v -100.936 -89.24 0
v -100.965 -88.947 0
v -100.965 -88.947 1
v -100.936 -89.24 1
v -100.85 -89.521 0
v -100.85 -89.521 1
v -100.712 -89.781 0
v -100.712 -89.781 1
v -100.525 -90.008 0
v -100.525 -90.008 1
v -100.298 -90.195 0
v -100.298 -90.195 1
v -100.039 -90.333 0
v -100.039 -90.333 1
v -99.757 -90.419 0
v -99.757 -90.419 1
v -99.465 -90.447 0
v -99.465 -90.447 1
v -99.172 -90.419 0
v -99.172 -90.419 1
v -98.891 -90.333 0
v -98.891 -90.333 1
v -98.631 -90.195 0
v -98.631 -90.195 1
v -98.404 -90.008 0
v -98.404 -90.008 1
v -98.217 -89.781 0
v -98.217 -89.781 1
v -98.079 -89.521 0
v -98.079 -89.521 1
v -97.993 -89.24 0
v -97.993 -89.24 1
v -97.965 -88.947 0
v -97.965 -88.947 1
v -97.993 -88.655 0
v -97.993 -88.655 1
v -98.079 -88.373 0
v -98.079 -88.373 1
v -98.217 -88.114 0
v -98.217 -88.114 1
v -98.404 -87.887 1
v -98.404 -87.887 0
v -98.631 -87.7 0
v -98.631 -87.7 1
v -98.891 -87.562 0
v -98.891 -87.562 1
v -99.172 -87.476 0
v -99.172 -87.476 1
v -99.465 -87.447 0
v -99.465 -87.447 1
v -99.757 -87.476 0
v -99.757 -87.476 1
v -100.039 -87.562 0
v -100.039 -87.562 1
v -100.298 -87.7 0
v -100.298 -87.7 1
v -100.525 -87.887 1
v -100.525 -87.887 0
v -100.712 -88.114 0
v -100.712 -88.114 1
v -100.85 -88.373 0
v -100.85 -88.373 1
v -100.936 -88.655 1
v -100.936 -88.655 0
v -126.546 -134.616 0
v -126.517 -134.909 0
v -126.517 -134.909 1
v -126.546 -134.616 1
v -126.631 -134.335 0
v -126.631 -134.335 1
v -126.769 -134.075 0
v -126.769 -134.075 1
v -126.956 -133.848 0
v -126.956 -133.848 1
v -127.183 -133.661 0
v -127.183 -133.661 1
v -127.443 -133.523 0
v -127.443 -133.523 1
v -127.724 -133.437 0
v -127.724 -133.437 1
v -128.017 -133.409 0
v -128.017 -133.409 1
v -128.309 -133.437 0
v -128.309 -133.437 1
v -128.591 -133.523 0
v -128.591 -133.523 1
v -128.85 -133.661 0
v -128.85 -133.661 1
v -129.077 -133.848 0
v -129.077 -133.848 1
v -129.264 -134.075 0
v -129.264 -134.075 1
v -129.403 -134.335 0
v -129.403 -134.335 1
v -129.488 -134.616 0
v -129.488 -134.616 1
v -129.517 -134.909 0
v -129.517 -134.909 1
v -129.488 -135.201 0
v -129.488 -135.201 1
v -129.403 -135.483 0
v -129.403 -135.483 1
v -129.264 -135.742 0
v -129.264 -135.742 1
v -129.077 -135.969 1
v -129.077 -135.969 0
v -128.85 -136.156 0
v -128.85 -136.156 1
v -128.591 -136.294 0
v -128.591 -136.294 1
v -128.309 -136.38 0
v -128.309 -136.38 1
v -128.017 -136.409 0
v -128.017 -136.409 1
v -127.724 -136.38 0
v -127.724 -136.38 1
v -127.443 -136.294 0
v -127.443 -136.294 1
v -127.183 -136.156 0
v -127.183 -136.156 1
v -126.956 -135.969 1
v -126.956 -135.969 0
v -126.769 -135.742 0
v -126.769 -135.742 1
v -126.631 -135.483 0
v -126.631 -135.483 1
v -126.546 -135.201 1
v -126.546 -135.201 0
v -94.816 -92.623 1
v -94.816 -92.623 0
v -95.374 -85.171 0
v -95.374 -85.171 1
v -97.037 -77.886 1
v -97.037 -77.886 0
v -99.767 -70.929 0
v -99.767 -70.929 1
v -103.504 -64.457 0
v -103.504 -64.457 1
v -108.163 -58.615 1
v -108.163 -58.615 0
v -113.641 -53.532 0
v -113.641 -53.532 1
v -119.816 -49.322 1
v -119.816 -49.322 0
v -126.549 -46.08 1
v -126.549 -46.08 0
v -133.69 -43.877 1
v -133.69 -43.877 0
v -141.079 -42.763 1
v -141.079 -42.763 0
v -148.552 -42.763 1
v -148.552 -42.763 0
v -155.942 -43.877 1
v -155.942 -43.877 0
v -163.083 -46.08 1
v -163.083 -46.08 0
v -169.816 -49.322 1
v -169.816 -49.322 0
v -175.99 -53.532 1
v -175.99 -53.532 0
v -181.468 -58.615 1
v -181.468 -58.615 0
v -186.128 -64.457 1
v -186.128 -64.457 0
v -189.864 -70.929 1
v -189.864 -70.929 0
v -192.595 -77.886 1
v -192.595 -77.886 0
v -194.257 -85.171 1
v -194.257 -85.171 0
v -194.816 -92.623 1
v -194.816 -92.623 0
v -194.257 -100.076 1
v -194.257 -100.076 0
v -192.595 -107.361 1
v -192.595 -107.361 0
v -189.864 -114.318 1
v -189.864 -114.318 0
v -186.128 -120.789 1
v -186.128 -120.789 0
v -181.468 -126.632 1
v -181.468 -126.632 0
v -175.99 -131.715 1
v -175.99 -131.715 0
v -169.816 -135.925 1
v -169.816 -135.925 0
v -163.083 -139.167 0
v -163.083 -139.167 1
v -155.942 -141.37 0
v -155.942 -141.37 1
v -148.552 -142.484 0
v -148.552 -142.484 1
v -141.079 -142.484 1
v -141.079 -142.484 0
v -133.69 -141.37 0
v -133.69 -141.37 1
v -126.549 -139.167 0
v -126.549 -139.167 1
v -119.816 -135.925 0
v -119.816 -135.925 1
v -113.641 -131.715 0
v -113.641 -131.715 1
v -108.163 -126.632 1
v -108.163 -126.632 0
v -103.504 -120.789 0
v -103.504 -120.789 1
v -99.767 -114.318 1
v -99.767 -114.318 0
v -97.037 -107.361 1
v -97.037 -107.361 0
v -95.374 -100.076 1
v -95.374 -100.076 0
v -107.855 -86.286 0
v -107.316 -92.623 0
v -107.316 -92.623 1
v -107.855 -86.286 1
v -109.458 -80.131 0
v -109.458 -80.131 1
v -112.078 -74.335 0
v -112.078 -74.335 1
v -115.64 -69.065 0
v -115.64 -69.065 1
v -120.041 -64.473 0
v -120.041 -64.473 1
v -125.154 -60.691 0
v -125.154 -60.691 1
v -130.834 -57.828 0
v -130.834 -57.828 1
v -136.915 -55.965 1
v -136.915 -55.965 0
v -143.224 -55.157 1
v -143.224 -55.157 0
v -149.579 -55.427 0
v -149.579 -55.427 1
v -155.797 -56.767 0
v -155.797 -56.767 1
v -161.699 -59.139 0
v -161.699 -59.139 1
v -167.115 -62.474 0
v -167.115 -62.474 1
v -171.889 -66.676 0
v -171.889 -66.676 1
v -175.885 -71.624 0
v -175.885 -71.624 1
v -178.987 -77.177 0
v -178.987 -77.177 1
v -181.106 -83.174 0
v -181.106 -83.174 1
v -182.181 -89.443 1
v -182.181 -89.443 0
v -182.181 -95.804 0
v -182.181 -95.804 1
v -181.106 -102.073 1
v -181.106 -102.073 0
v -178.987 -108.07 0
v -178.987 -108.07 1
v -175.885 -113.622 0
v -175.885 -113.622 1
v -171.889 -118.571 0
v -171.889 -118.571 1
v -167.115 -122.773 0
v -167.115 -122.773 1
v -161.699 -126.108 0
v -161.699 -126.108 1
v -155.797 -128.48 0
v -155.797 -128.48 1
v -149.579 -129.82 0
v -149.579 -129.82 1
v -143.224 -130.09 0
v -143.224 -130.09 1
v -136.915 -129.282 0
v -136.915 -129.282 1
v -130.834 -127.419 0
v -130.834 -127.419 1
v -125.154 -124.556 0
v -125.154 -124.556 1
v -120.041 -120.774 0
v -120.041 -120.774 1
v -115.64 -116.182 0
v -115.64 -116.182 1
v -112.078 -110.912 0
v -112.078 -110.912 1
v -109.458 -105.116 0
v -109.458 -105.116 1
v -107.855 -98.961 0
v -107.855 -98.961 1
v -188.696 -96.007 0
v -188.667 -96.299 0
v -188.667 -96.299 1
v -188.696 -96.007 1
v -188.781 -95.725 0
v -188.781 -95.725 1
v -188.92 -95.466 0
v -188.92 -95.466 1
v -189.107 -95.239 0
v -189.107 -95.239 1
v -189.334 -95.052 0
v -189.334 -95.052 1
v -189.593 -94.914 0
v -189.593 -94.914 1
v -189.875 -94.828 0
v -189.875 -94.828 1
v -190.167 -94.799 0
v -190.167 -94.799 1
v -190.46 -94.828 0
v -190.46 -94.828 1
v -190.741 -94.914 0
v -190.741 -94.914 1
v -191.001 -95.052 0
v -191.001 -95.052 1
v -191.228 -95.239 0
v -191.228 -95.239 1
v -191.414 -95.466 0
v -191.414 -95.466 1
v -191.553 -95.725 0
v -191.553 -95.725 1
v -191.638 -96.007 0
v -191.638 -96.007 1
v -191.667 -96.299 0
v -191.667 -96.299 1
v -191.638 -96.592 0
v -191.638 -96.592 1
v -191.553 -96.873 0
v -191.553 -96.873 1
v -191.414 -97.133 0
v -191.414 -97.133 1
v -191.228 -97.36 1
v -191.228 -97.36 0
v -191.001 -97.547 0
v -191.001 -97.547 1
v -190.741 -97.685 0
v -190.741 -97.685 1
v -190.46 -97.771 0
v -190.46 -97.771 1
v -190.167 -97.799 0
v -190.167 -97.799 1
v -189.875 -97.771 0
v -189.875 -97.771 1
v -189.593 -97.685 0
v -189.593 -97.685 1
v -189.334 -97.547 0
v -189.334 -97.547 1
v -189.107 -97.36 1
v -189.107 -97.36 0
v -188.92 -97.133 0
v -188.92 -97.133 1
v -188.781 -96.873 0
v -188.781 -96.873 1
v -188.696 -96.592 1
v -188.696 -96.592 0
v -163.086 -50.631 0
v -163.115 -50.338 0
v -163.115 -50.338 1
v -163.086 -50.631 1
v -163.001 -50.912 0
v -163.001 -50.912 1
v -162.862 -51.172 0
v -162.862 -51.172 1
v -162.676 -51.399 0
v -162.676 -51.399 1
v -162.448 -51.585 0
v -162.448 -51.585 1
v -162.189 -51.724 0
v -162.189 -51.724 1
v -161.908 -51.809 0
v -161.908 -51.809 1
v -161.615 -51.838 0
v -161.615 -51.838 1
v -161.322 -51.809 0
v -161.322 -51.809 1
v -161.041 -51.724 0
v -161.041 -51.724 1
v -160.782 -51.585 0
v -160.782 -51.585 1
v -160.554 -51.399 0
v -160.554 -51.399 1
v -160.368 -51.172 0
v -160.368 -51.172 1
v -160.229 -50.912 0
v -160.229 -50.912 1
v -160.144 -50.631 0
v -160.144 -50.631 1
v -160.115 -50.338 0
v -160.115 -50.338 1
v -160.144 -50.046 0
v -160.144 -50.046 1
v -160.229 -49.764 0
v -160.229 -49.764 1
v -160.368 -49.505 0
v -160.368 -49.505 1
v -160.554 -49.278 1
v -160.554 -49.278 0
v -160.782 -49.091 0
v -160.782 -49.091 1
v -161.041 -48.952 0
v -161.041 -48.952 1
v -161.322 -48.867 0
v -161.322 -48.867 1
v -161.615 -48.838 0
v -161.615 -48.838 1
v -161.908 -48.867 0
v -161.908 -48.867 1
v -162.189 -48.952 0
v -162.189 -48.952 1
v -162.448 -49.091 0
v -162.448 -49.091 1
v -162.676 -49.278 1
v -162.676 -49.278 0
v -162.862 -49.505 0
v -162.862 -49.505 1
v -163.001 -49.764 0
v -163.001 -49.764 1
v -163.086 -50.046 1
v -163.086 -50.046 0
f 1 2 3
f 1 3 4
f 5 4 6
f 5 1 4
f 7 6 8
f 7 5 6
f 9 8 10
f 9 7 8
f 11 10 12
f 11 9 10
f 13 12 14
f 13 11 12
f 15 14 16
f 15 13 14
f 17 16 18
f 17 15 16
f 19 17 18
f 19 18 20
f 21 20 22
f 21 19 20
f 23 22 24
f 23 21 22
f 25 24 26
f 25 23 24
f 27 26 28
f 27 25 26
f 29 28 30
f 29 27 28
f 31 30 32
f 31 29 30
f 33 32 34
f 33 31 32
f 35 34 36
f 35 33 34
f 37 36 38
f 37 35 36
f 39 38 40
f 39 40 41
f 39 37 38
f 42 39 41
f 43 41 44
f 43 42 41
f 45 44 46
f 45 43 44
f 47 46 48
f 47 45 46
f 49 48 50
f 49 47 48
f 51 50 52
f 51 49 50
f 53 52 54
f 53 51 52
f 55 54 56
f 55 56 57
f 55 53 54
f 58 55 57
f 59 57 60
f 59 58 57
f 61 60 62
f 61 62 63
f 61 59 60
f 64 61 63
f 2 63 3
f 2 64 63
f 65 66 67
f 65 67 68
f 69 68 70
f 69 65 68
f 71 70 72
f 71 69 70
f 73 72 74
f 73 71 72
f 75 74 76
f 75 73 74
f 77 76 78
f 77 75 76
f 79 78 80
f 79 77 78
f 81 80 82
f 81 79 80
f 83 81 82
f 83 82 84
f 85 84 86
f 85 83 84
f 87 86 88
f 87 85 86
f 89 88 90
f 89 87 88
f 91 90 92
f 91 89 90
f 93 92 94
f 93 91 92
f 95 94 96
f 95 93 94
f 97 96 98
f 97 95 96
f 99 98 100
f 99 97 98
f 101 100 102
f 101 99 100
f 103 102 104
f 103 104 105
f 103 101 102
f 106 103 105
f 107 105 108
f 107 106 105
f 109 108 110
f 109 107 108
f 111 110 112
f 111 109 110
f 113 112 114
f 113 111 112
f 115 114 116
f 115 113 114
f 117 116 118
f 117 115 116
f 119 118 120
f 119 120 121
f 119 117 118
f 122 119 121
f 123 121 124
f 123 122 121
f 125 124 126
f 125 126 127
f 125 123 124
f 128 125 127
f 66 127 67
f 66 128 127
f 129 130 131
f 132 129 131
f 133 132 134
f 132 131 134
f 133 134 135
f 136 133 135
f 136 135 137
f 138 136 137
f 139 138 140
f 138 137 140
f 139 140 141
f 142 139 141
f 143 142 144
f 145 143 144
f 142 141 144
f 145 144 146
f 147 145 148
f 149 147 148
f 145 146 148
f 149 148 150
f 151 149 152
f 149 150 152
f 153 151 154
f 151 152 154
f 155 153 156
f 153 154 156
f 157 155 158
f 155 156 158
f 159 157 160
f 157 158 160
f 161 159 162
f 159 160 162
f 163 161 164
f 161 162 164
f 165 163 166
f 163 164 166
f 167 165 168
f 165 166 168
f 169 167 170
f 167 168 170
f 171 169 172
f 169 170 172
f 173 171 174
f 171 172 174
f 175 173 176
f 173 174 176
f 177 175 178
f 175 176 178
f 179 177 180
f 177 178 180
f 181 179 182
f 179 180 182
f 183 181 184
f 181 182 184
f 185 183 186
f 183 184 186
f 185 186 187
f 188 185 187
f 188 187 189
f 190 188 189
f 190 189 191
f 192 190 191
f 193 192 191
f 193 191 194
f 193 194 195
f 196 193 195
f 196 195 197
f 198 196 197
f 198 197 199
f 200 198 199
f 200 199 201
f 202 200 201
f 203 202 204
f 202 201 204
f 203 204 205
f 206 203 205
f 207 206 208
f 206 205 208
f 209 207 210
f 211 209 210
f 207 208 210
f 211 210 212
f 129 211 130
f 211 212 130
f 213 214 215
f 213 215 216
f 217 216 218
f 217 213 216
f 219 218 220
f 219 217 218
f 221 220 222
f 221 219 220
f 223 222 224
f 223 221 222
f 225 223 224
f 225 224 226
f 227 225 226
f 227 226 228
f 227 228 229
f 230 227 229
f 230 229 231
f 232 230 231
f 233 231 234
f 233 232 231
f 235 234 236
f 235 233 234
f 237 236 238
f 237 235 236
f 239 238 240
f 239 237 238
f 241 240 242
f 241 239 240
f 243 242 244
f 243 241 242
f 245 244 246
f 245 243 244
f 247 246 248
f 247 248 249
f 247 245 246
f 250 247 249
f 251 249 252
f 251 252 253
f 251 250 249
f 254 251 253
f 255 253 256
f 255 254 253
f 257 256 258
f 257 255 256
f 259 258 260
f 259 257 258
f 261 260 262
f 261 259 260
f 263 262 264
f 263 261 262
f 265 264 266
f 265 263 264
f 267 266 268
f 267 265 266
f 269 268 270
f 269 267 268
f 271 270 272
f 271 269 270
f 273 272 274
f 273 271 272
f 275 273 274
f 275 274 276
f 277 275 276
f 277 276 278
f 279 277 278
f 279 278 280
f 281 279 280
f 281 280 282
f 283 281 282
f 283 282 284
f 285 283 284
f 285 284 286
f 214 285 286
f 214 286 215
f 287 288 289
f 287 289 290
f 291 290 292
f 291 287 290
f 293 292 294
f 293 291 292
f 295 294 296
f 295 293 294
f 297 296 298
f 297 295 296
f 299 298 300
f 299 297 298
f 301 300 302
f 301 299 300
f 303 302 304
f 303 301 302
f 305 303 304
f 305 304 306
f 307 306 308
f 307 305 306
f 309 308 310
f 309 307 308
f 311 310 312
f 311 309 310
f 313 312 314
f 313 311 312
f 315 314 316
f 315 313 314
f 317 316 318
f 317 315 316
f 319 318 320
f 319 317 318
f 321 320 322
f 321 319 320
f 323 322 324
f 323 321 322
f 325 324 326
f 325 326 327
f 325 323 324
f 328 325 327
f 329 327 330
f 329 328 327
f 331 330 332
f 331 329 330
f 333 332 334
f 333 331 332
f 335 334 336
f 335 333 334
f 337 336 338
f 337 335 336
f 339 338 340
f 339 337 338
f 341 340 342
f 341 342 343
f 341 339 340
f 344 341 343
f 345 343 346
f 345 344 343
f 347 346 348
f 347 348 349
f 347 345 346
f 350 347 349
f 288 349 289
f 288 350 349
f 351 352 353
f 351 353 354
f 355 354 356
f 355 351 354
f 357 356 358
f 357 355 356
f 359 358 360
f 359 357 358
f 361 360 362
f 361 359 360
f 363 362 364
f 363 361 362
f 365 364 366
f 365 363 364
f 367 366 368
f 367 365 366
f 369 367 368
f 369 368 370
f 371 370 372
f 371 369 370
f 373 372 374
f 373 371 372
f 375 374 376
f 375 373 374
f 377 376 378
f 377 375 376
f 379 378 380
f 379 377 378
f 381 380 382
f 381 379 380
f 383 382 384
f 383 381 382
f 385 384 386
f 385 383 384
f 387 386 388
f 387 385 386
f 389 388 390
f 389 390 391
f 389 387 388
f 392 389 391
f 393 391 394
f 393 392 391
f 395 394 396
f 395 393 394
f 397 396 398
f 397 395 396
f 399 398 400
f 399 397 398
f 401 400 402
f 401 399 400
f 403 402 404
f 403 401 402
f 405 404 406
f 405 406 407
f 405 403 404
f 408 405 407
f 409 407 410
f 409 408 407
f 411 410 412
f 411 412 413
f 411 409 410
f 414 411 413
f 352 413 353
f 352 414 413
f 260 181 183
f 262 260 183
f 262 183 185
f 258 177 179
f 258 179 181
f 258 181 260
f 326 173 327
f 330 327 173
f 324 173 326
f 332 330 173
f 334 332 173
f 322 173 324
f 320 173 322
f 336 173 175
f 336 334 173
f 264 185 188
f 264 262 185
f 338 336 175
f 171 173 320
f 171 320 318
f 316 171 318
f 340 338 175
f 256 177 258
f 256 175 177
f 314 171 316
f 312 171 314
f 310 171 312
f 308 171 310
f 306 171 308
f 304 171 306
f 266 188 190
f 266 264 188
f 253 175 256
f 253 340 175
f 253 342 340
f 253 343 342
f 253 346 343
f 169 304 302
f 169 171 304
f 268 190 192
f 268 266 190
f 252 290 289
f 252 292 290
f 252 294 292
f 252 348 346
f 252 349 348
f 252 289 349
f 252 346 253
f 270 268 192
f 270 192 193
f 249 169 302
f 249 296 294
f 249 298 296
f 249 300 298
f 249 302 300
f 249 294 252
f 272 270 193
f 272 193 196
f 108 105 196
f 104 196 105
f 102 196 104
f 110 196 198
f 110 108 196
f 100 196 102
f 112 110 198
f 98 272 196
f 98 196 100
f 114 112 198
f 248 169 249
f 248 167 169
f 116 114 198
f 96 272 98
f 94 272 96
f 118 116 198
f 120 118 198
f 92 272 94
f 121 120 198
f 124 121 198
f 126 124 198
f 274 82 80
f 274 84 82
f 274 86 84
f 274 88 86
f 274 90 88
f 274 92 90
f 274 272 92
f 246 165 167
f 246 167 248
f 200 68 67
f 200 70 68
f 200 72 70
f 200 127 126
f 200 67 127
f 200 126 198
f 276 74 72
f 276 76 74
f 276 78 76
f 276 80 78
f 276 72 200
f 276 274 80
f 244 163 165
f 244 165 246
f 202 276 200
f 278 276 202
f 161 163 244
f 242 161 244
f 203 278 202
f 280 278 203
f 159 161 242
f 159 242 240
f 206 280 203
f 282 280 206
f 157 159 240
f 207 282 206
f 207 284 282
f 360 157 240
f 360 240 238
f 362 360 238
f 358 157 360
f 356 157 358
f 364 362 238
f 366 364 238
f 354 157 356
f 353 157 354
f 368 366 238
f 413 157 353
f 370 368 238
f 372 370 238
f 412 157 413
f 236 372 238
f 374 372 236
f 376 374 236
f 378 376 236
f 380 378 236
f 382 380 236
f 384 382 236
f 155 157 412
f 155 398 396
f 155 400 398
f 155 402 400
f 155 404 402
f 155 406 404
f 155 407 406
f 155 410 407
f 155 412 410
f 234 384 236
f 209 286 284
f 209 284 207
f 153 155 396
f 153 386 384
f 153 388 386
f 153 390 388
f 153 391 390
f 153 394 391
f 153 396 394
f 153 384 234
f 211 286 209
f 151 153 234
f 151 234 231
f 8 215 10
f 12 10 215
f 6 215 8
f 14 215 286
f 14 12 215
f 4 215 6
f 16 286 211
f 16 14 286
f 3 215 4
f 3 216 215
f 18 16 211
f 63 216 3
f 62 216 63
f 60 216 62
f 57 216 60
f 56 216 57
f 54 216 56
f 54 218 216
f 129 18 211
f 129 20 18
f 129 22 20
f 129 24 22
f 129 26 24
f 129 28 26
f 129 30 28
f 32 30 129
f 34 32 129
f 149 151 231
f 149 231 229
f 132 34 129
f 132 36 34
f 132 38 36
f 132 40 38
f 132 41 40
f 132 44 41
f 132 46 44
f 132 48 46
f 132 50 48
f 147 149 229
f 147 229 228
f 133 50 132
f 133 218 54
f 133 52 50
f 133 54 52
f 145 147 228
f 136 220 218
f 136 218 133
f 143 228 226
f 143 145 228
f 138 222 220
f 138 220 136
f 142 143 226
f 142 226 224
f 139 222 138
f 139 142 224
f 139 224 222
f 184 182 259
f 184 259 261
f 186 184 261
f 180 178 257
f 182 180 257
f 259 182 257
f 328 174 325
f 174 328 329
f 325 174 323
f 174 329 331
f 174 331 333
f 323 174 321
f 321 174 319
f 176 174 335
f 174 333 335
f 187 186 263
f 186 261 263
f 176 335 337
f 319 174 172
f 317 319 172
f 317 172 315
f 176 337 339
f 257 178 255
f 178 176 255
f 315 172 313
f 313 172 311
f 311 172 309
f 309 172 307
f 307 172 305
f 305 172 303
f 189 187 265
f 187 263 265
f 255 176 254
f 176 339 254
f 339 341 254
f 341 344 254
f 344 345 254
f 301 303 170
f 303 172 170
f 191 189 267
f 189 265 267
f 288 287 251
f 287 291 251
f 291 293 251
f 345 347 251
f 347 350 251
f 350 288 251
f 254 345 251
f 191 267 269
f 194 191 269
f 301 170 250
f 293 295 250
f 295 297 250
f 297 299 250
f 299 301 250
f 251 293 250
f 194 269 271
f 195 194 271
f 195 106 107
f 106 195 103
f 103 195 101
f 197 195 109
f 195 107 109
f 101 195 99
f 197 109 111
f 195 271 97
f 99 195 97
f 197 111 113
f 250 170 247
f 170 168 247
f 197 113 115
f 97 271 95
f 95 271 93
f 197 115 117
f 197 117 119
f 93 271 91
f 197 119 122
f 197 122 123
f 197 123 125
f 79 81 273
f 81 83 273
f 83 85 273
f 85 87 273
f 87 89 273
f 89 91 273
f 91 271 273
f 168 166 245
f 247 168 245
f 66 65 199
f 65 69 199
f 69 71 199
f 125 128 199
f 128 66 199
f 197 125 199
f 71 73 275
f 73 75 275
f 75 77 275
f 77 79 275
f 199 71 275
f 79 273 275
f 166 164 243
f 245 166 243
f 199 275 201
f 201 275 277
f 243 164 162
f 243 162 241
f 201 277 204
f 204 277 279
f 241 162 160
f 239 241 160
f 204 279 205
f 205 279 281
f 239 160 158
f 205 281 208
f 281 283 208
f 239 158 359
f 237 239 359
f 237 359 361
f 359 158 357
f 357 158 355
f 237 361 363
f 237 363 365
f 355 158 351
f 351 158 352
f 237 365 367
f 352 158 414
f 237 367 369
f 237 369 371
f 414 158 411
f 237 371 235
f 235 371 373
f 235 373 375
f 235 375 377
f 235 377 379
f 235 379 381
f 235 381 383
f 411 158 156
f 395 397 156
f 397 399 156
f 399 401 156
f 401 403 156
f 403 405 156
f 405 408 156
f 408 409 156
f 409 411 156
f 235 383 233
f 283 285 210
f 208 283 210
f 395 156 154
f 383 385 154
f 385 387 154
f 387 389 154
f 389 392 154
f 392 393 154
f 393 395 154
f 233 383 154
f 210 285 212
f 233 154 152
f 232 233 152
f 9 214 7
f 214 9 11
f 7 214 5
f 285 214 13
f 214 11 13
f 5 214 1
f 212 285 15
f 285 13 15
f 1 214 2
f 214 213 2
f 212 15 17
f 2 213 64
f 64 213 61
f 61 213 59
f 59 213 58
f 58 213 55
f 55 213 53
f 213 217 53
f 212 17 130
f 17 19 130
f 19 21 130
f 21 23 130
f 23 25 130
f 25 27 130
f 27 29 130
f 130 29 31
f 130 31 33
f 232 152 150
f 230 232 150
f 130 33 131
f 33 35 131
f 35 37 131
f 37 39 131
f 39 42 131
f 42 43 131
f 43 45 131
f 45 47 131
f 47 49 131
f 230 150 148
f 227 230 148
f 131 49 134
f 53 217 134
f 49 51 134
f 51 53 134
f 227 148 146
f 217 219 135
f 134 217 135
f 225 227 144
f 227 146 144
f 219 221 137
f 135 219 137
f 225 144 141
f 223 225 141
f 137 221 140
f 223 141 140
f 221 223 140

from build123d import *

# Parameters (mm, degrees)
SKETCH_1_R      = 50
SKETCH_1_R_2    = 37.5
SKETCH_1_R_3    = 1.5
EXTRUDE_1_DEPTH = 1


with BuildPart() as part:
    # 草图1 → 凸台-拉伸1 (new body)
    with BuildSketch(Plane.XY):
        with Locations((-144.815895817, -92.623408185)):
            Circle(SKETCH_1_R)
        with Locations((-144.815895817, -92.623408185)):
            Circle(SKETCH_1_R_2, mode=Mode.SUBTRACT)
        with Locations((-190.167161981, -96.299364834)):
            Circle(SKETCH_1_R_3, mode=Mode.SUBTRACT)
        with Locations((-128.01669653, -134.908593573)):
            Circle(SKETCH_1_R_3, mode=Mode.SUBTRACT)
        with Locations(Location((-99.464629653, -88.947451536, 0), (0, 0, 180))):
            Circle(SKETCH_1_R_3, mode=Mode.SUBTRACT)
        with Locations(Location((-161.615095104, -50.338222797, 0), (0, 0, 180))):
            Circle(SKETCH_1_R_3, mode=Mode.SUBTRACT)
    extrude(amount=EXTRUDE_1_DEPTH)


solid = part.part
